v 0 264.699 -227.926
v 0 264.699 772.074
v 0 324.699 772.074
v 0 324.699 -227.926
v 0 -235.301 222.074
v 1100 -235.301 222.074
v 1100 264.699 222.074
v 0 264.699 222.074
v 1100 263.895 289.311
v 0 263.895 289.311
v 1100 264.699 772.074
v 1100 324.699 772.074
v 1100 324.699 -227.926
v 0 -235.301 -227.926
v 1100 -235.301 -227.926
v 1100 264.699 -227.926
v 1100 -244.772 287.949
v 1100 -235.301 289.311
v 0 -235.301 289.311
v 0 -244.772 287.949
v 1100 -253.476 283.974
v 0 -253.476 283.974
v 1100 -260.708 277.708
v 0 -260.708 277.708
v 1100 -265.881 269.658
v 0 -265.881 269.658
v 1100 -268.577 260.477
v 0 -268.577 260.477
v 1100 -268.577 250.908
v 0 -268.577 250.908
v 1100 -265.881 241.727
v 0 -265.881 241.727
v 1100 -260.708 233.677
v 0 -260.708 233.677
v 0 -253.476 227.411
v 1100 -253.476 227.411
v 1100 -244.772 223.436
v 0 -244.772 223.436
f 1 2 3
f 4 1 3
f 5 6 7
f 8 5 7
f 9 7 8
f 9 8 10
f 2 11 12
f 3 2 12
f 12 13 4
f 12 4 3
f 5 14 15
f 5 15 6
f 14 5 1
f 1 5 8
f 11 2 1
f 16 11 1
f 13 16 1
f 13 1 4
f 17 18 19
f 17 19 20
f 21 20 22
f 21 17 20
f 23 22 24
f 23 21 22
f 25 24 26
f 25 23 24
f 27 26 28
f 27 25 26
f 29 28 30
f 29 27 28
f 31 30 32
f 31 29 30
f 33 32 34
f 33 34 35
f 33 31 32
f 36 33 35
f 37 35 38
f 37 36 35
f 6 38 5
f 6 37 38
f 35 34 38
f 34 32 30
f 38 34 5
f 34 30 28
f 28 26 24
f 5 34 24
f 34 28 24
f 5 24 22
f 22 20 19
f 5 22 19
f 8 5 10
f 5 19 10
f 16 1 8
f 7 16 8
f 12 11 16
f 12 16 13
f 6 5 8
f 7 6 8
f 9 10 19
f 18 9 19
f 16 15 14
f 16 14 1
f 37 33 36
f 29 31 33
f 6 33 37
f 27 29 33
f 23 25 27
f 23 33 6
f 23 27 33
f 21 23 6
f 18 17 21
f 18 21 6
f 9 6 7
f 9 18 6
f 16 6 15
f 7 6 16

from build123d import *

# Parameters (mm, degrees)
F0_W     = 500
F0_H     = 450
F1_DEPTH = 1100
F3_DEPTH = 1100
F4_W     = 60
F4_H     = 1000
F5_DEPTH = 1100


with BuildPart() as f1:
    # F0 (on Right) → F1 (new body)
    with BuildSketch(Plane.YZ):
        with Locations((14.699318, -2.926279)):
            Rectangle(F0_W, F0_H)
    extrude(amount=F1_DEPTH)


with BuildPart() as f3:
    # F2 (on face) → F3 (new body)
    with BuildSketch(Plane.YZ.offset(1100)):
        with BuildLine():
            Line((263.895035, 289.310813), (-235.300682, 289.310813))
            ThreePointArc((-235.300682, 289.310813), (-268.919228, 255.692267), (-235.300682, 222.073721))
            Line((-235.300682, 222.073721), (264.699318, 222.073721))
            Line((264.699318, 222.073721), (263.895035, 289.310813))
        make_face()
    extrude(amount=-F3_DEPTH)


with BuildPart() as f5:
    # F4 (on face) → F5 (new body)
    with BuildSketch(Plane.YZ.offset(1100)):
        with Locations((294.699318, 272.073721)):
            Rectangle(F4_W, F4_H)
        Polygon((264.699318, 222.073721), (264.699318, -227.926279), (324.699318, -227.926279), (324.699318, 772.073721), (264.699318, 772.073721), align=None)
    extrude(amount=-F5_DEPTH)


solid = Compound([f1.part, f3.part, f5.part])
